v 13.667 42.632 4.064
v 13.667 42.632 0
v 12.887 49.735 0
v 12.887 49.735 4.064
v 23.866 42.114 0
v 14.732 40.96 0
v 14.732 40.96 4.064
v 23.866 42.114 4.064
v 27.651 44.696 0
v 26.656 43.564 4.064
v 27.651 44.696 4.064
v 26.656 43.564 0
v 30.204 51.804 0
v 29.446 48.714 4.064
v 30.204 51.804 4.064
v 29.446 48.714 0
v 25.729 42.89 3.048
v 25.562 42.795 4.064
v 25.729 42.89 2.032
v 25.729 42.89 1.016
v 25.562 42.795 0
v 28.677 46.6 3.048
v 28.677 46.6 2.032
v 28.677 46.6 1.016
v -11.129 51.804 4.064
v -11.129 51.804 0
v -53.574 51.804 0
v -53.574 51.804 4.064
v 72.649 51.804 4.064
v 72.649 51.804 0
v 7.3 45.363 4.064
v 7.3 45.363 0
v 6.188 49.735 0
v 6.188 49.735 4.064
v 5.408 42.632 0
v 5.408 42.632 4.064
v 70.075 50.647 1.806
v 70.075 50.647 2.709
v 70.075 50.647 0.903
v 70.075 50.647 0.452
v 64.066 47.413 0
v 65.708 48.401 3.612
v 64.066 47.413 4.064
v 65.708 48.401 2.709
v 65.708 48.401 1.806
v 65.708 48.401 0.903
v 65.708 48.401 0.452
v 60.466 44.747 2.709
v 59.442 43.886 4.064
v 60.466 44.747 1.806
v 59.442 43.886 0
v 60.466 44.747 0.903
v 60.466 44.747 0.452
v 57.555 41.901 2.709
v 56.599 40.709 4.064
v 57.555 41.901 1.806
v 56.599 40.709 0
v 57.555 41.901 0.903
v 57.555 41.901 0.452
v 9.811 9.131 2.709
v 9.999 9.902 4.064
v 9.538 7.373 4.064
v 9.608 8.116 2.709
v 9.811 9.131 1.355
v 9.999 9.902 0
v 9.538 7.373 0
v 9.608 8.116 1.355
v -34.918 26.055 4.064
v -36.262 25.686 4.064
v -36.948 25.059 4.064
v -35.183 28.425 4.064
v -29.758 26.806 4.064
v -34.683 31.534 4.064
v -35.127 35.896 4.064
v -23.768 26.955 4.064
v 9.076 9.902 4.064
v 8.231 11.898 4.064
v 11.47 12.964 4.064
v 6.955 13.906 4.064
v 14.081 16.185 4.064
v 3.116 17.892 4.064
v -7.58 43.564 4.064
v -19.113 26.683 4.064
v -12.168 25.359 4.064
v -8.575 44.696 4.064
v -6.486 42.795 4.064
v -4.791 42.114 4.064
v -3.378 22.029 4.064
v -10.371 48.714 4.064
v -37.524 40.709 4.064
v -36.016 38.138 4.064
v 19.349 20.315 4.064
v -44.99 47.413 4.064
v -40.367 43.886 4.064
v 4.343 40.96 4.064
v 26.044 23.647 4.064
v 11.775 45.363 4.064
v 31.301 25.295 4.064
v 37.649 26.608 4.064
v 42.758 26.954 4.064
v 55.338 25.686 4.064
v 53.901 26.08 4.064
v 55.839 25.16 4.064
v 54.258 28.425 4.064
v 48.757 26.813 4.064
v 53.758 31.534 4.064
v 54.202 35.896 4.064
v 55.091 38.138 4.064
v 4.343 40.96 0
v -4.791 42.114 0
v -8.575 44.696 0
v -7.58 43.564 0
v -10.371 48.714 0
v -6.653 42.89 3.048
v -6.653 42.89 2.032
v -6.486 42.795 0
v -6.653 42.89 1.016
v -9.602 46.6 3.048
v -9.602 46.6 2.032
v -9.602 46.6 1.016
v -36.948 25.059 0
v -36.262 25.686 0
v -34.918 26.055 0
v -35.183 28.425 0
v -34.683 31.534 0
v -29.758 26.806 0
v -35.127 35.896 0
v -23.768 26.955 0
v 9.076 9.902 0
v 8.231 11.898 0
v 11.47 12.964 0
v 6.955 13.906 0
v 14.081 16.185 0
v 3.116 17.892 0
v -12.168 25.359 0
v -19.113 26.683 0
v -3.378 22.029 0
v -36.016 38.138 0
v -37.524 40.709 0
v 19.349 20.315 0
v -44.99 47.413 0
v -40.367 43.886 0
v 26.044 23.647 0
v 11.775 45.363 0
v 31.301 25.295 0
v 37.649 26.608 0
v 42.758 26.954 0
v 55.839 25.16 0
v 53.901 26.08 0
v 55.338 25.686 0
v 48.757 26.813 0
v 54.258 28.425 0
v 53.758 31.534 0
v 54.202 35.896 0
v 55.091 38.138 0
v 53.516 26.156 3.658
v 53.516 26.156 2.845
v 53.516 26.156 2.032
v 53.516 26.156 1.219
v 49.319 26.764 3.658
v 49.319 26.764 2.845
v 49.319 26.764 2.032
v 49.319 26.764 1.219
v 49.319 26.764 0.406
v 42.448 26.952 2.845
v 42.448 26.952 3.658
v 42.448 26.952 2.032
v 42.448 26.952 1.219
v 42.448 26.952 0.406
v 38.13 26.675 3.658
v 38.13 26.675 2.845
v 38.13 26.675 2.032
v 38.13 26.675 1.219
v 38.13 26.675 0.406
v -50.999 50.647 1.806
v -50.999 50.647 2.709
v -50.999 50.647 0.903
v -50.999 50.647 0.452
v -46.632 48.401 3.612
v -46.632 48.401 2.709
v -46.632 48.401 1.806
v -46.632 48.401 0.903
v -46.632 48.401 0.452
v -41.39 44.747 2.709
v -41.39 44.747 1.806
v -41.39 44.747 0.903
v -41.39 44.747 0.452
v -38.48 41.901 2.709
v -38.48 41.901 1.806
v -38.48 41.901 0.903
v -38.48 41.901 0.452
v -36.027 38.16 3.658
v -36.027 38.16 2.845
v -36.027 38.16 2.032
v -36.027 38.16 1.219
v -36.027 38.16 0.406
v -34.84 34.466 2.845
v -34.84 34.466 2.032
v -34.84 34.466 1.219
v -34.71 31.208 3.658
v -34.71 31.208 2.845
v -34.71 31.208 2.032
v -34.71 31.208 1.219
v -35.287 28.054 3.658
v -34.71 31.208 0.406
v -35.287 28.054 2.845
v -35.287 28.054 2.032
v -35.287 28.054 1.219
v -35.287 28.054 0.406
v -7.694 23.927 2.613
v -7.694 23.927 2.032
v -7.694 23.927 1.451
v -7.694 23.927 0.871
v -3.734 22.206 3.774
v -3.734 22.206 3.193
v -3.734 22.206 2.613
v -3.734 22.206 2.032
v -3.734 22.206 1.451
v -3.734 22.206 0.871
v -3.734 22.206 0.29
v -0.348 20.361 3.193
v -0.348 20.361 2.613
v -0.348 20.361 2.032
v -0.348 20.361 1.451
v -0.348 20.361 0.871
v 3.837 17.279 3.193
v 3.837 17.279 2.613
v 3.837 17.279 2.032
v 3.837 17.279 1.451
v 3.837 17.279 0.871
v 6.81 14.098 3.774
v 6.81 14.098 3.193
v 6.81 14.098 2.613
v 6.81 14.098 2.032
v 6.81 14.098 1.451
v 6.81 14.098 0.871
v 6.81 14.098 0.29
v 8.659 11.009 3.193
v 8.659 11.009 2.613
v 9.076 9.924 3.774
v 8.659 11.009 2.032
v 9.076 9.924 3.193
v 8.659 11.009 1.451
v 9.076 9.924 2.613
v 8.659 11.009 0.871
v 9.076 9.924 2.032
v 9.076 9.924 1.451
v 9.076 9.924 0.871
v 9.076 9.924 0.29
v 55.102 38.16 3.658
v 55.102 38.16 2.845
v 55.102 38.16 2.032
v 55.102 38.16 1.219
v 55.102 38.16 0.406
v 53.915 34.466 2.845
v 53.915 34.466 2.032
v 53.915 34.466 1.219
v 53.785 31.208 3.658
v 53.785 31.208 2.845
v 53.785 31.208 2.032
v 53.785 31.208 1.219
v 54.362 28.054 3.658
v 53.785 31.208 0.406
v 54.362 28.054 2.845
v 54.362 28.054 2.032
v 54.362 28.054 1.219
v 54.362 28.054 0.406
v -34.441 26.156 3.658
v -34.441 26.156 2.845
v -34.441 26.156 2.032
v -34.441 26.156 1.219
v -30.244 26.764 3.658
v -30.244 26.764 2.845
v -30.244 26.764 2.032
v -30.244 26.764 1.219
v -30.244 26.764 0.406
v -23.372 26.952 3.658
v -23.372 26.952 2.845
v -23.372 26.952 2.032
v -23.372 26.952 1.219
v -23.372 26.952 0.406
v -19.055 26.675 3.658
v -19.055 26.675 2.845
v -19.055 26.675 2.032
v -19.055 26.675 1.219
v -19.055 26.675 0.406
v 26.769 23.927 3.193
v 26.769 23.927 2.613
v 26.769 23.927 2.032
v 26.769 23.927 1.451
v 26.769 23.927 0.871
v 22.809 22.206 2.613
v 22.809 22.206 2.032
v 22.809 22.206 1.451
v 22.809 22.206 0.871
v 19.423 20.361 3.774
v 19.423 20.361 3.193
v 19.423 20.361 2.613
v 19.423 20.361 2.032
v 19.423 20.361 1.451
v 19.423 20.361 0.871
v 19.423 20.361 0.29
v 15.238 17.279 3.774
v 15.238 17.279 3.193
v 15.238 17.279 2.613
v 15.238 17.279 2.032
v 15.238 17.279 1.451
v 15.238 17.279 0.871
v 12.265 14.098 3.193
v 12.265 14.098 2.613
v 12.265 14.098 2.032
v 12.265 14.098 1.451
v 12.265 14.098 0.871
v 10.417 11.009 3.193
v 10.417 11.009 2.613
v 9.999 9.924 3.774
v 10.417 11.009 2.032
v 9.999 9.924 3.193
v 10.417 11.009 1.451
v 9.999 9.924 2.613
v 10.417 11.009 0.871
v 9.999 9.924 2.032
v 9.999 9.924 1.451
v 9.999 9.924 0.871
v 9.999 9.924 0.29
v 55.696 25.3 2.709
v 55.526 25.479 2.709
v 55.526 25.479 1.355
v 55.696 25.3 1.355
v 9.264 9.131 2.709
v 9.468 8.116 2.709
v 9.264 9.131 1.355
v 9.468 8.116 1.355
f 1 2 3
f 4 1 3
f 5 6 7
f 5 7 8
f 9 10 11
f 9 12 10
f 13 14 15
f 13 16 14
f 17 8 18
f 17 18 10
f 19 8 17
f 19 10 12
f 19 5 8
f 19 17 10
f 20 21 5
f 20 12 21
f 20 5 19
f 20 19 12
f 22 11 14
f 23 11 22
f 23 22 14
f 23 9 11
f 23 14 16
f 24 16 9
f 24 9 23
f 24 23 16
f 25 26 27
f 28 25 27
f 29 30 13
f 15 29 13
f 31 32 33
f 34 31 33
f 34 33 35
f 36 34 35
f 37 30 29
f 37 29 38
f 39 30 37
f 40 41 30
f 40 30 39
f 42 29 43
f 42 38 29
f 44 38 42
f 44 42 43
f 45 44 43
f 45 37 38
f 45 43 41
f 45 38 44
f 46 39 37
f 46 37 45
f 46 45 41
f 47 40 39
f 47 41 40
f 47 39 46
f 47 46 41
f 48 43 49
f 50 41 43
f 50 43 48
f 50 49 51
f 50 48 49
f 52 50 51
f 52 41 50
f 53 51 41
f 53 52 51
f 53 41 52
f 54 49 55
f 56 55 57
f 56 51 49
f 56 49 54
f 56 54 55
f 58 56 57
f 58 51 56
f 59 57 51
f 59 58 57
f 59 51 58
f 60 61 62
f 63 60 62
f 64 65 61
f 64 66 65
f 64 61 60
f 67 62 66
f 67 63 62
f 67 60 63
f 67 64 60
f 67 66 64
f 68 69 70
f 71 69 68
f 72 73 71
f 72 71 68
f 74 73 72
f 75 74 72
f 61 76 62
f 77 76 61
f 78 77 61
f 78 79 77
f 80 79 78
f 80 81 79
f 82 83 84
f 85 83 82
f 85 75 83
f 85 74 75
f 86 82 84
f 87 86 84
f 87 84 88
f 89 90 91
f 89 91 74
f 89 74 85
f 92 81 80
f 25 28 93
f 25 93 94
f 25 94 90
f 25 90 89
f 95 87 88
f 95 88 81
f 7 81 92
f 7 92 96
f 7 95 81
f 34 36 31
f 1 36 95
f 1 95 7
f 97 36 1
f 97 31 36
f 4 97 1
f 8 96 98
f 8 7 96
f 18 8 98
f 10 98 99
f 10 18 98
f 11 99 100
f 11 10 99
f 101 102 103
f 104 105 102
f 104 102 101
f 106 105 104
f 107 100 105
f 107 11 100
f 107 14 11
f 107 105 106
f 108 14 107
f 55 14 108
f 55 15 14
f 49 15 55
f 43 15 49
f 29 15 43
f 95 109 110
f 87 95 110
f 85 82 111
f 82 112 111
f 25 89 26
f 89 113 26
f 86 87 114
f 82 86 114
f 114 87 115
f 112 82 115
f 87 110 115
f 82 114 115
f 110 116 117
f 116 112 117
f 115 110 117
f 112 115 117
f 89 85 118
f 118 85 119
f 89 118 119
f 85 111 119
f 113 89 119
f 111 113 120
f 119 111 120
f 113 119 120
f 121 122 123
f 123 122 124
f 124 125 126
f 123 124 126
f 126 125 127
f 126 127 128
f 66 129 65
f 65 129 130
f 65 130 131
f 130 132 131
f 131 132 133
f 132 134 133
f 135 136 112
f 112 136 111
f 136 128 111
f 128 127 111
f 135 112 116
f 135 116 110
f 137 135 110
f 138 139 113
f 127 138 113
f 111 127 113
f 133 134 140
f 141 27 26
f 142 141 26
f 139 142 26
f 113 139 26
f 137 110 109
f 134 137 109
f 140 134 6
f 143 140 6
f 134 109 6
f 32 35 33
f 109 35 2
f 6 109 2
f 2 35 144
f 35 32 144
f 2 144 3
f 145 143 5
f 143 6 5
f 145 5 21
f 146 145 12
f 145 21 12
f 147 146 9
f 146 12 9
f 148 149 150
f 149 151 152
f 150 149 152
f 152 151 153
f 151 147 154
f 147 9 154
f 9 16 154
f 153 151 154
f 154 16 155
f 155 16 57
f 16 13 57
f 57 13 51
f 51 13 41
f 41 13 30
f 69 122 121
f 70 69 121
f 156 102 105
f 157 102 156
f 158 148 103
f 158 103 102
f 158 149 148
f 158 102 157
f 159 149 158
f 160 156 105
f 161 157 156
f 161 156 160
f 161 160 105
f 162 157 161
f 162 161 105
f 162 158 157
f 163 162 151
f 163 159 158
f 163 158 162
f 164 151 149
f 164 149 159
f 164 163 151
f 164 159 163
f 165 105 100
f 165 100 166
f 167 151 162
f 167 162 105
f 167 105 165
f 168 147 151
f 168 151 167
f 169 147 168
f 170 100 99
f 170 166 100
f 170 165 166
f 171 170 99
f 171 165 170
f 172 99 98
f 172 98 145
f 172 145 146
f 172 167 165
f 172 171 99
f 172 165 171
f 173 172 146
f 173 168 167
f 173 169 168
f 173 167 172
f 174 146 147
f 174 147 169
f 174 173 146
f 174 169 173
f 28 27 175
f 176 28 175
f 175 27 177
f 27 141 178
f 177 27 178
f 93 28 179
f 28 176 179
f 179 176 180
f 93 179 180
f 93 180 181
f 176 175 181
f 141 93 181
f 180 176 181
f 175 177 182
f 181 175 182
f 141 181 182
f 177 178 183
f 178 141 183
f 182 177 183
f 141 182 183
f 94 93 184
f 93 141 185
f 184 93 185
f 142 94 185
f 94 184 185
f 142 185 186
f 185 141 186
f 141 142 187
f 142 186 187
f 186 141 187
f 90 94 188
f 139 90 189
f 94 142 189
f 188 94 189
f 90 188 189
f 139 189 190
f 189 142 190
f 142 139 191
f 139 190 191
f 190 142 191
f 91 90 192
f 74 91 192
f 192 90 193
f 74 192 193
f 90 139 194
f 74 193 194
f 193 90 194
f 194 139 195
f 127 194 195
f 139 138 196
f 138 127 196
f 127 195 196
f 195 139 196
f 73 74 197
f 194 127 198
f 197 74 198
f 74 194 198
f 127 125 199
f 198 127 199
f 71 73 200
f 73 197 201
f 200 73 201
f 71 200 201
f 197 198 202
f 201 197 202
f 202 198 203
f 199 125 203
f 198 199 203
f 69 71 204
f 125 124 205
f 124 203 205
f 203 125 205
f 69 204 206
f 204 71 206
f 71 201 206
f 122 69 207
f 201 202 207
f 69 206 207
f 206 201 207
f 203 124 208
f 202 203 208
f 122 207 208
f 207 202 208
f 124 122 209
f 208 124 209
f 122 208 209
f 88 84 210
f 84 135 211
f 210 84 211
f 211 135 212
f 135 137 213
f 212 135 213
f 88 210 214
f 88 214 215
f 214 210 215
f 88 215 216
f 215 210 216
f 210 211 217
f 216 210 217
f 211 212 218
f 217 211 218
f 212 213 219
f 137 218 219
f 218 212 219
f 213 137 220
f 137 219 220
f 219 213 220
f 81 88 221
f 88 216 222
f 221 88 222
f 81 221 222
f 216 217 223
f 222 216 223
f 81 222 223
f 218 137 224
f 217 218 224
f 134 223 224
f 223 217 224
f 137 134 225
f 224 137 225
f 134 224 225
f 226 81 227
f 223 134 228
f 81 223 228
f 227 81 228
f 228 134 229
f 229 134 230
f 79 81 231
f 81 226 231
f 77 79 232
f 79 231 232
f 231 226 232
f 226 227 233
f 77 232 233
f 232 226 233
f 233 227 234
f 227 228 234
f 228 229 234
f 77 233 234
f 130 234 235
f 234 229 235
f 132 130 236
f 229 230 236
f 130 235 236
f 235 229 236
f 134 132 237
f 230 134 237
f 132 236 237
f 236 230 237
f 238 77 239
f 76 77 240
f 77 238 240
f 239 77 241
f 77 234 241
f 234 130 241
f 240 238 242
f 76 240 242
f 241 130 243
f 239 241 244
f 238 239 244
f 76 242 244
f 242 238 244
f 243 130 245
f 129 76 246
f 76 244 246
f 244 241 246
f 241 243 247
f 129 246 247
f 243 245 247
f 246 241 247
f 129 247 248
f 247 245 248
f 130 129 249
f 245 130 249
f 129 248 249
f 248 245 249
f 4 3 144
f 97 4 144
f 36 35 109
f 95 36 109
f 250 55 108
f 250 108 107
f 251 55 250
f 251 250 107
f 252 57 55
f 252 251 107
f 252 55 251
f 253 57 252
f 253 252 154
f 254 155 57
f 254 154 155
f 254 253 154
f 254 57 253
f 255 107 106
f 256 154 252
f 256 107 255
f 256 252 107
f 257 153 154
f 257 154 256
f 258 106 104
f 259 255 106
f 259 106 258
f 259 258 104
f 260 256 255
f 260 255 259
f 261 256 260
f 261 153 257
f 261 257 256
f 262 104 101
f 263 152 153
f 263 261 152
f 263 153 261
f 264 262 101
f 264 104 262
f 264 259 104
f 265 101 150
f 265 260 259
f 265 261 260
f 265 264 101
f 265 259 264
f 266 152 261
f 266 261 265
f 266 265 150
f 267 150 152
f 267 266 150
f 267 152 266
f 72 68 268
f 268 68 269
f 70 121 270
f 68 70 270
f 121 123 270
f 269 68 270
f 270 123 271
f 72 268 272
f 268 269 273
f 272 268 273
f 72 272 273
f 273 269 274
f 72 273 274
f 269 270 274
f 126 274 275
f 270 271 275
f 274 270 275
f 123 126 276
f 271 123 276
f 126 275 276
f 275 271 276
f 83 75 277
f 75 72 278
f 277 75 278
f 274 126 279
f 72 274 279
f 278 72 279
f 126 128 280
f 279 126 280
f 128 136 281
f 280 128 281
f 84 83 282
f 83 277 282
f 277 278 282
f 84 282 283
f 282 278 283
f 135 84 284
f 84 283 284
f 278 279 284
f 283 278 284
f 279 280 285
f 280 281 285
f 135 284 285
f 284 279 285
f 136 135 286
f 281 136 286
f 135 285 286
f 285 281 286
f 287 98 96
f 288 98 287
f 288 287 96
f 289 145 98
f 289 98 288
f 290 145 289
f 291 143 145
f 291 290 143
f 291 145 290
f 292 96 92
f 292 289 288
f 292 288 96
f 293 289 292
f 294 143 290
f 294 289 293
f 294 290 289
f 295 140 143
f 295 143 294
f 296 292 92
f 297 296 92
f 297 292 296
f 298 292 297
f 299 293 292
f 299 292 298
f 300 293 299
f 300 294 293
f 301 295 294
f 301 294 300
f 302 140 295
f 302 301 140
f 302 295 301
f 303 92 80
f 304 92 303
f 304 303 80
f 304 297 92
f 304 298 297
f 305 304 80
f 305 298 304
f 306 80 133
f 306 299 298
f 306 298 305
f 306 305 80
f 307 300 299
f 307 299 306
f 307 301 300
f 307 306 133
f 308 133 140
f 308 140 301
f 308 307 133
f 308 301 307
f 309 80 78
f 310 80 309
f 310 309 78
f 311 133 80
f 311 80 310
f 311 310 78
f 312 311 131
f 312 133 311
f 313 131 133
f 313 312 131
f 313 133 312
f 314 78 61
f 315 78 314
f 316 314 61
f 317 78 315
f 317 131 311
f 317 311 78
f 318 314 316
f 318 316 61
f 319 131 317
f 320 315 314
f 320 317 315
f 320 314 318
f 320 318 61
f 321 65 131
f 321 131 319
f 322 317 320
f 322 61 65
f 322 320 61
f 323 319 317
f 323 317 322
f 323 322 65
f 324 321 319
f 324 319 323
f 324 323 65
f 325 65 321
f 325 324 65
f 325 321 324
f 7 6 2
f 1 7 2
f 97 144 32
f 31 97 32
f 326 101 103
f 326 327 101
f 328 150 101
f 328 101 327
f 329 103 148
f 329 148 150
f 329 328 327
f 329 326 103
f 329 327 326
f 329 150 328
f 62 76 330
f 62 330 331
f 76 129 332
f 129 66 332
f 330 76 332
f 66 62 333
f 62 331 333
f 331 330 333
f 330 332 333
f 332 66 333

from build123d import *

# Parameters (mm, degrees)
F1_DEPTH = 4.064


with BuildPart() as f1:
    # F0 (on Top) → F1 (new body)
    with BuildSketch(Plane.XY):
        with BuildLine():
            Line((13.6671597138, 42.632304132), (12.8873176873, 49.7349761426))
            Line((12.8873176873, 49.7349761426), (11.7750391364, 45.363266021))
            Line((11.7750391364, 45.363266021), (9.6299545839, 45.363266021))
            Line((9.6299545839, 45.363266021), (9.5376307145, 45.363266021))
            Line((9.5376307145, 45.363266021), (9.445306845, 45.363266021))
            Line((9.445306845, 45.363266021), (7.3002222925, 45.363266021))
            Line((7.3002222925, 45.363266021), (6.1879437417, 49.7349761426))
            Line((6.1879437417, 49.7349761426), (5.4081017151, 42.632304132))
            Line((5.4081017151, 42.632304132), (4.3431557715, 40.9597270191))
            add(Edge.make_bspline(
                [(4.3431557715, 40.9597270191), (1.9470362998, 41.1418379201), (-2.357038673, 41.4689580744), (-6.9601017508, 42.5573058945), (-9.7806573386, 45.8408531237), (-11.222149647, 51.6629143973), (-11.1291911453, 51.8044307828)],
                knots=[0, 0, 0, 0, 0.2791440222, 0.5014177355, 0.7333883427, 0.9815334433, 0.9815334433, 0.9815334433, 0.9815334433], degree=3))
            Line((-11.1291911453, 51.8044307828), (-53.5737704486, 51.8044307828))
            add(Edge.make_bspline(
                [(-53.5737704486, 51.8044307828), (-53.331550141, 51.6895557808), (-52.7337940502, 51.4060649668), (-50.9219179894, 50.6256536216), (-49.0522210727, 49.7426960013), (-46.5670205655, 48.3883088566), (-44.0019337549, 46.8397463887), (-41.3899670191, 44.7566613363), (-39.9614993816, 43.5732234586), (-38.4642324185, 41.9185011416), (-37.8183975035, 41.0877673058), (-37.5235918909, 40.7085604966)],
                knots=[0, 0, 0, 0, 0.0720465987, 0.1777980287, 0.2890758676, 0.4160349982, 0.5505153507, 0.6884386234, 0.7936780409, 0.9058197844, 1, 1, 1, 1], degree=3))
            add(Edge.make_bspline(
                [(-37.5235918909, 40.7085604966), (-37.2811948097, 40.3417350246), (-36.7727730223, 39.572327814), (-35.9997815422, 38.1522405248), (-35.1818151491, 36.362725978), (-34.8165629489, 34.4825183921), (-34.6421546924, 32.8488236867), (-34.6606346519, 31.2214463286), (-34.9793113173, 29.4064345295), (-35.2129943023, 28.111564098), (-35.9426425608, 26.2262566595), (-36.1784507702, 25.8278168456), (-36.262312904, 25.6861168891)],
                knots=[0, 0, 0, 0, 0.0927914954, 0.1946278301, 0.3073288384, 0.4182534795, 0.520402479, 0.6230535978, 0.7301202583, 0.8256545016, 0.9379962828, 1, 1, 1, 1], degree=3))
            Line((-36.262312904, 25.6861168891), (-36.9484815747, 25.0586289912))
            add(Edge.make_bspline(
                [(-36.9484815747, 25.0586289912), (-36.2927983345, 25.4205569717), (-35.2230048161, 26.0110680355), (-34.4440105433, 26.1610657915), (-32.5025116368, 26.4697436316), (-30.2089582356, 26.8154999431), (-26.7915939584, 26.9803785335), (-23.4060896846, 26.9492345331), (-21.4941127934, 26.9466449845), (-18.9895672442, 26.7117037325), (-15.2690707432, 26.0406941434), (-13.1709685572, 25.5797541049), (-12.168219313, 25.3594563147)],
                knots=[0, 0, 0, 0, 0.0900102597, 0.1468580962, 0.2340180307, 0.333396138, 0.4533337916, 0.5714198117, 0.6591745985, 0.7598521597, 0.8852257688, 1, 1, 1, 1], degree=3))
            add(Edge.make_bspline(
                [(-12.168219313, 25.3594563147), (-11.5927154739, 25.2013632729), (-10.3185449844, 24.8513439076), (-7.6750947876, 23.9458975941), (-5.5408645813, 23.0804982874), (-3.7358019992, 22.2160027355), (-2.121426525, 21.3894995265), (-0.3086467266, 20.3773885972), (1.9186226291, 18.8653724774), (3.8473616626, 17.3192025529), (5.4318073678, 15.7795195321), (6.8297771435, 14.132580906), (7.8709295154, 12.5955164802), (8.6203443926, 11.1860368327), (9.0868606877, 9.9440901455), (9.0772179693, 9.9067459923), (9.0760700405, 9.9023003131)],
                knots=[0, 0, 0, 0, 0.073116965, 0.1618815945, 0.2432672502, 0.3176519131, 0.3885252589, 0.4648909183, 0.5521919339, 0.6359509825, 0.7147565687, 0.7925888029, 0.8643737633, 0.9350621826, 0.9922694003, 1, 1, 1, 1], degree=3))
            add(Edge.make_bspline(
                [(9.0760700405, 9.9023003131), (9.137154494, 9.657856123), (9.2679873126, 9.1342970084), (9.4896489626, 8.1212998598), (9.5225281441, 7.6083459483), (9.5376307145, 7.3727280833)],
                knots=[0, 0, 0, 0, 0.3213460752, 0.6882702612, 1, 1, 1, 1], degree=3))
            add(Edge.make_bspline(
                [(9.9991913885, 9.9023003131), (9.938106935, 9.657856123), (9.8072741164, 9.1342970084), (9.5856124664, 8.1212998598), (9.5527332849, 7.6083459483), (9.5376307145, 7.3727280833)],
                knots=[0, 0, 0, 0, 0.3213460752, 0.6882702612, 1, 1, 1, 1], degree=3))
            add(Edge.make_bspline(
                [(31.3012346565, 25.2954269687), (30.7202419304, 25.1358261093), (29.379202367, 24.8929209133), (26.7563461994, 23.9357044231), (24.6147259112, 23.08288084), (22.8114042768, 22.2154227122), (21.1965911316, 21.3896642896), (19.3839392402, 20.3773356985), (17.1566303783, 18.8653868158), (15.2279018497, 17.3191989823), (13.6434534859, 15.779520599), (12.2454845603, 14.1325801248), (11.2043313904, 12.5955184335), (10.4549187001, 11.1860304057), (9.9883976023, 9.9441023012), (9.9980443233, 9.9067426475), (9.9991913885, 9.9023003131)],
                knots=[0, 0, 0, 0, 0.0738143205, 0.1625121665, 0.2438365904, 0.3181652888, 0.3889853118, 0.4652935163, 0.5525288496, 0.6362248807, 0.7149711762, 0.7927448521, 0.8644758039, 0.9351110396, 0.9922752165, 1, 1, 1, 1], degree=3))
            add(Edge.make_bspline(
                [(55.8391954986, 25.1604420744), (55.246479862, 25.4870860225), (54.2702798275, 26.0164091642), (53.5192238195, 26.1610914996), (51.5777860665, 26.4697420881), (49.2842349376, 26.8154654043), (45.8667598685, 26.9805498729), (42.4816667945, 26.9486749581), (40.5684752021, 26.9482375341), (38.0691959493, 26.7039679144), (34.3327479962, 26.0774511266), (32.2980847571, 25.5144287536), (31.3012346565, 25.2954269687)],
                knots=[0.008454002, 0.008454002, 0.008454002, 0.008454002, 0.0900789157, 0.1469701134, 0.23419653, 0.3336504387, 0.4536795757, 0.5718556669, 0.6596773895, 0.7604317432, 0.8859009821, 1, 1, 1, 1], degree=3))
            add(Edge.make_bspline(
                [(55.337574333, 25.6861168891), (55.5330474391, 25.4694040439), (55.7124456782, 25.2762853184), (55.8391954986, 25.1604420744)],
                knots=[0, 0, 0, 0, 0.5157653391, 0.5157653391, 0.5157653391, 0.5157653391], degree=3))
            add(Edge.make_bspline(
                [(56.5988533199, 40.7085604966), (56.3564562387, 40.3417350246), (55.8480344512, 39.572327814), (55.0750429712, 38.1522405248), (54.257076578, 36.362725978), (53.8918243778, 34.4825183921), (53.7174161213, 32.8488236867), (53.7358960808, 31.2214463286), (54.0545727462, 29.4064345295), (54.2882557312, 28.111564098), (55.0179039898, 26.2262566595), (55.2537121991, 25.8278168456), (55.337574333, 25.6861168891)],
                knots=[0, 0, 0, 0, 0.0927914954, 0.1946278301, 0.3073288384, 0.4182534795, 0.520402479, 0.6230535978, 0.7301202583, 0.8256545016, 0.9379962828, 1, 1, 1, 1], degree=3))
            add(Edge.make_bspline(
                [(72.6490318775, 51.8044307828), (72.4068115699, 51.6895557808), (71.8090554792, 51.4060649668), (69.9971794183, 50.6256536216), (68.1274825017, 49.7426960013), (65.6422819945, 48.3883088566), (63.0771951838, 46.8397463887), (60.4652284481, 44.7566613363), (59.0367608106, 43.5732234586), (57.5394938475, 41.9185011416), (56.8936589325, 41.0877673058), (56.5988533199, 40.7085604966)],
                knots=[0, 0, 0, 0, 0.0720465987, 0.1777980287, 0.2890758676, 0.4160349982, 0.5505153507, 0.6884386234, 0.7936780409, 0.9058197844, 1, 1, 1, 1], degree=3))
            Line((72.6490318775, 51.8044307828), (30.2044525743, 51.8044307828))
            add(Edge.make_bspline(
                [(14.7321056575, 40.9597270191), (17.1282251292, 41.1418379201), (21.4323001019, 41.4689580744), (26.0353631797, 42.5573058945), (28.8559187675, 45.8408531237), (30.2974110759, 51.6629143973), (30.2044525743, 51.8044307828)],
                knots=[0, 0, 0, 0, 0.2791440222, 0.5014177355, 0.7333883427, 0.9815334433, 0.9815334433, 0.9815334433, 0.9815334433], degree=3))
            Line((14.7321056575, 40.9597270191), (13.6671597138, 42.632304132))
        make_face()
    extrude(amount=F1_DEPTH)


solid = f1.part
